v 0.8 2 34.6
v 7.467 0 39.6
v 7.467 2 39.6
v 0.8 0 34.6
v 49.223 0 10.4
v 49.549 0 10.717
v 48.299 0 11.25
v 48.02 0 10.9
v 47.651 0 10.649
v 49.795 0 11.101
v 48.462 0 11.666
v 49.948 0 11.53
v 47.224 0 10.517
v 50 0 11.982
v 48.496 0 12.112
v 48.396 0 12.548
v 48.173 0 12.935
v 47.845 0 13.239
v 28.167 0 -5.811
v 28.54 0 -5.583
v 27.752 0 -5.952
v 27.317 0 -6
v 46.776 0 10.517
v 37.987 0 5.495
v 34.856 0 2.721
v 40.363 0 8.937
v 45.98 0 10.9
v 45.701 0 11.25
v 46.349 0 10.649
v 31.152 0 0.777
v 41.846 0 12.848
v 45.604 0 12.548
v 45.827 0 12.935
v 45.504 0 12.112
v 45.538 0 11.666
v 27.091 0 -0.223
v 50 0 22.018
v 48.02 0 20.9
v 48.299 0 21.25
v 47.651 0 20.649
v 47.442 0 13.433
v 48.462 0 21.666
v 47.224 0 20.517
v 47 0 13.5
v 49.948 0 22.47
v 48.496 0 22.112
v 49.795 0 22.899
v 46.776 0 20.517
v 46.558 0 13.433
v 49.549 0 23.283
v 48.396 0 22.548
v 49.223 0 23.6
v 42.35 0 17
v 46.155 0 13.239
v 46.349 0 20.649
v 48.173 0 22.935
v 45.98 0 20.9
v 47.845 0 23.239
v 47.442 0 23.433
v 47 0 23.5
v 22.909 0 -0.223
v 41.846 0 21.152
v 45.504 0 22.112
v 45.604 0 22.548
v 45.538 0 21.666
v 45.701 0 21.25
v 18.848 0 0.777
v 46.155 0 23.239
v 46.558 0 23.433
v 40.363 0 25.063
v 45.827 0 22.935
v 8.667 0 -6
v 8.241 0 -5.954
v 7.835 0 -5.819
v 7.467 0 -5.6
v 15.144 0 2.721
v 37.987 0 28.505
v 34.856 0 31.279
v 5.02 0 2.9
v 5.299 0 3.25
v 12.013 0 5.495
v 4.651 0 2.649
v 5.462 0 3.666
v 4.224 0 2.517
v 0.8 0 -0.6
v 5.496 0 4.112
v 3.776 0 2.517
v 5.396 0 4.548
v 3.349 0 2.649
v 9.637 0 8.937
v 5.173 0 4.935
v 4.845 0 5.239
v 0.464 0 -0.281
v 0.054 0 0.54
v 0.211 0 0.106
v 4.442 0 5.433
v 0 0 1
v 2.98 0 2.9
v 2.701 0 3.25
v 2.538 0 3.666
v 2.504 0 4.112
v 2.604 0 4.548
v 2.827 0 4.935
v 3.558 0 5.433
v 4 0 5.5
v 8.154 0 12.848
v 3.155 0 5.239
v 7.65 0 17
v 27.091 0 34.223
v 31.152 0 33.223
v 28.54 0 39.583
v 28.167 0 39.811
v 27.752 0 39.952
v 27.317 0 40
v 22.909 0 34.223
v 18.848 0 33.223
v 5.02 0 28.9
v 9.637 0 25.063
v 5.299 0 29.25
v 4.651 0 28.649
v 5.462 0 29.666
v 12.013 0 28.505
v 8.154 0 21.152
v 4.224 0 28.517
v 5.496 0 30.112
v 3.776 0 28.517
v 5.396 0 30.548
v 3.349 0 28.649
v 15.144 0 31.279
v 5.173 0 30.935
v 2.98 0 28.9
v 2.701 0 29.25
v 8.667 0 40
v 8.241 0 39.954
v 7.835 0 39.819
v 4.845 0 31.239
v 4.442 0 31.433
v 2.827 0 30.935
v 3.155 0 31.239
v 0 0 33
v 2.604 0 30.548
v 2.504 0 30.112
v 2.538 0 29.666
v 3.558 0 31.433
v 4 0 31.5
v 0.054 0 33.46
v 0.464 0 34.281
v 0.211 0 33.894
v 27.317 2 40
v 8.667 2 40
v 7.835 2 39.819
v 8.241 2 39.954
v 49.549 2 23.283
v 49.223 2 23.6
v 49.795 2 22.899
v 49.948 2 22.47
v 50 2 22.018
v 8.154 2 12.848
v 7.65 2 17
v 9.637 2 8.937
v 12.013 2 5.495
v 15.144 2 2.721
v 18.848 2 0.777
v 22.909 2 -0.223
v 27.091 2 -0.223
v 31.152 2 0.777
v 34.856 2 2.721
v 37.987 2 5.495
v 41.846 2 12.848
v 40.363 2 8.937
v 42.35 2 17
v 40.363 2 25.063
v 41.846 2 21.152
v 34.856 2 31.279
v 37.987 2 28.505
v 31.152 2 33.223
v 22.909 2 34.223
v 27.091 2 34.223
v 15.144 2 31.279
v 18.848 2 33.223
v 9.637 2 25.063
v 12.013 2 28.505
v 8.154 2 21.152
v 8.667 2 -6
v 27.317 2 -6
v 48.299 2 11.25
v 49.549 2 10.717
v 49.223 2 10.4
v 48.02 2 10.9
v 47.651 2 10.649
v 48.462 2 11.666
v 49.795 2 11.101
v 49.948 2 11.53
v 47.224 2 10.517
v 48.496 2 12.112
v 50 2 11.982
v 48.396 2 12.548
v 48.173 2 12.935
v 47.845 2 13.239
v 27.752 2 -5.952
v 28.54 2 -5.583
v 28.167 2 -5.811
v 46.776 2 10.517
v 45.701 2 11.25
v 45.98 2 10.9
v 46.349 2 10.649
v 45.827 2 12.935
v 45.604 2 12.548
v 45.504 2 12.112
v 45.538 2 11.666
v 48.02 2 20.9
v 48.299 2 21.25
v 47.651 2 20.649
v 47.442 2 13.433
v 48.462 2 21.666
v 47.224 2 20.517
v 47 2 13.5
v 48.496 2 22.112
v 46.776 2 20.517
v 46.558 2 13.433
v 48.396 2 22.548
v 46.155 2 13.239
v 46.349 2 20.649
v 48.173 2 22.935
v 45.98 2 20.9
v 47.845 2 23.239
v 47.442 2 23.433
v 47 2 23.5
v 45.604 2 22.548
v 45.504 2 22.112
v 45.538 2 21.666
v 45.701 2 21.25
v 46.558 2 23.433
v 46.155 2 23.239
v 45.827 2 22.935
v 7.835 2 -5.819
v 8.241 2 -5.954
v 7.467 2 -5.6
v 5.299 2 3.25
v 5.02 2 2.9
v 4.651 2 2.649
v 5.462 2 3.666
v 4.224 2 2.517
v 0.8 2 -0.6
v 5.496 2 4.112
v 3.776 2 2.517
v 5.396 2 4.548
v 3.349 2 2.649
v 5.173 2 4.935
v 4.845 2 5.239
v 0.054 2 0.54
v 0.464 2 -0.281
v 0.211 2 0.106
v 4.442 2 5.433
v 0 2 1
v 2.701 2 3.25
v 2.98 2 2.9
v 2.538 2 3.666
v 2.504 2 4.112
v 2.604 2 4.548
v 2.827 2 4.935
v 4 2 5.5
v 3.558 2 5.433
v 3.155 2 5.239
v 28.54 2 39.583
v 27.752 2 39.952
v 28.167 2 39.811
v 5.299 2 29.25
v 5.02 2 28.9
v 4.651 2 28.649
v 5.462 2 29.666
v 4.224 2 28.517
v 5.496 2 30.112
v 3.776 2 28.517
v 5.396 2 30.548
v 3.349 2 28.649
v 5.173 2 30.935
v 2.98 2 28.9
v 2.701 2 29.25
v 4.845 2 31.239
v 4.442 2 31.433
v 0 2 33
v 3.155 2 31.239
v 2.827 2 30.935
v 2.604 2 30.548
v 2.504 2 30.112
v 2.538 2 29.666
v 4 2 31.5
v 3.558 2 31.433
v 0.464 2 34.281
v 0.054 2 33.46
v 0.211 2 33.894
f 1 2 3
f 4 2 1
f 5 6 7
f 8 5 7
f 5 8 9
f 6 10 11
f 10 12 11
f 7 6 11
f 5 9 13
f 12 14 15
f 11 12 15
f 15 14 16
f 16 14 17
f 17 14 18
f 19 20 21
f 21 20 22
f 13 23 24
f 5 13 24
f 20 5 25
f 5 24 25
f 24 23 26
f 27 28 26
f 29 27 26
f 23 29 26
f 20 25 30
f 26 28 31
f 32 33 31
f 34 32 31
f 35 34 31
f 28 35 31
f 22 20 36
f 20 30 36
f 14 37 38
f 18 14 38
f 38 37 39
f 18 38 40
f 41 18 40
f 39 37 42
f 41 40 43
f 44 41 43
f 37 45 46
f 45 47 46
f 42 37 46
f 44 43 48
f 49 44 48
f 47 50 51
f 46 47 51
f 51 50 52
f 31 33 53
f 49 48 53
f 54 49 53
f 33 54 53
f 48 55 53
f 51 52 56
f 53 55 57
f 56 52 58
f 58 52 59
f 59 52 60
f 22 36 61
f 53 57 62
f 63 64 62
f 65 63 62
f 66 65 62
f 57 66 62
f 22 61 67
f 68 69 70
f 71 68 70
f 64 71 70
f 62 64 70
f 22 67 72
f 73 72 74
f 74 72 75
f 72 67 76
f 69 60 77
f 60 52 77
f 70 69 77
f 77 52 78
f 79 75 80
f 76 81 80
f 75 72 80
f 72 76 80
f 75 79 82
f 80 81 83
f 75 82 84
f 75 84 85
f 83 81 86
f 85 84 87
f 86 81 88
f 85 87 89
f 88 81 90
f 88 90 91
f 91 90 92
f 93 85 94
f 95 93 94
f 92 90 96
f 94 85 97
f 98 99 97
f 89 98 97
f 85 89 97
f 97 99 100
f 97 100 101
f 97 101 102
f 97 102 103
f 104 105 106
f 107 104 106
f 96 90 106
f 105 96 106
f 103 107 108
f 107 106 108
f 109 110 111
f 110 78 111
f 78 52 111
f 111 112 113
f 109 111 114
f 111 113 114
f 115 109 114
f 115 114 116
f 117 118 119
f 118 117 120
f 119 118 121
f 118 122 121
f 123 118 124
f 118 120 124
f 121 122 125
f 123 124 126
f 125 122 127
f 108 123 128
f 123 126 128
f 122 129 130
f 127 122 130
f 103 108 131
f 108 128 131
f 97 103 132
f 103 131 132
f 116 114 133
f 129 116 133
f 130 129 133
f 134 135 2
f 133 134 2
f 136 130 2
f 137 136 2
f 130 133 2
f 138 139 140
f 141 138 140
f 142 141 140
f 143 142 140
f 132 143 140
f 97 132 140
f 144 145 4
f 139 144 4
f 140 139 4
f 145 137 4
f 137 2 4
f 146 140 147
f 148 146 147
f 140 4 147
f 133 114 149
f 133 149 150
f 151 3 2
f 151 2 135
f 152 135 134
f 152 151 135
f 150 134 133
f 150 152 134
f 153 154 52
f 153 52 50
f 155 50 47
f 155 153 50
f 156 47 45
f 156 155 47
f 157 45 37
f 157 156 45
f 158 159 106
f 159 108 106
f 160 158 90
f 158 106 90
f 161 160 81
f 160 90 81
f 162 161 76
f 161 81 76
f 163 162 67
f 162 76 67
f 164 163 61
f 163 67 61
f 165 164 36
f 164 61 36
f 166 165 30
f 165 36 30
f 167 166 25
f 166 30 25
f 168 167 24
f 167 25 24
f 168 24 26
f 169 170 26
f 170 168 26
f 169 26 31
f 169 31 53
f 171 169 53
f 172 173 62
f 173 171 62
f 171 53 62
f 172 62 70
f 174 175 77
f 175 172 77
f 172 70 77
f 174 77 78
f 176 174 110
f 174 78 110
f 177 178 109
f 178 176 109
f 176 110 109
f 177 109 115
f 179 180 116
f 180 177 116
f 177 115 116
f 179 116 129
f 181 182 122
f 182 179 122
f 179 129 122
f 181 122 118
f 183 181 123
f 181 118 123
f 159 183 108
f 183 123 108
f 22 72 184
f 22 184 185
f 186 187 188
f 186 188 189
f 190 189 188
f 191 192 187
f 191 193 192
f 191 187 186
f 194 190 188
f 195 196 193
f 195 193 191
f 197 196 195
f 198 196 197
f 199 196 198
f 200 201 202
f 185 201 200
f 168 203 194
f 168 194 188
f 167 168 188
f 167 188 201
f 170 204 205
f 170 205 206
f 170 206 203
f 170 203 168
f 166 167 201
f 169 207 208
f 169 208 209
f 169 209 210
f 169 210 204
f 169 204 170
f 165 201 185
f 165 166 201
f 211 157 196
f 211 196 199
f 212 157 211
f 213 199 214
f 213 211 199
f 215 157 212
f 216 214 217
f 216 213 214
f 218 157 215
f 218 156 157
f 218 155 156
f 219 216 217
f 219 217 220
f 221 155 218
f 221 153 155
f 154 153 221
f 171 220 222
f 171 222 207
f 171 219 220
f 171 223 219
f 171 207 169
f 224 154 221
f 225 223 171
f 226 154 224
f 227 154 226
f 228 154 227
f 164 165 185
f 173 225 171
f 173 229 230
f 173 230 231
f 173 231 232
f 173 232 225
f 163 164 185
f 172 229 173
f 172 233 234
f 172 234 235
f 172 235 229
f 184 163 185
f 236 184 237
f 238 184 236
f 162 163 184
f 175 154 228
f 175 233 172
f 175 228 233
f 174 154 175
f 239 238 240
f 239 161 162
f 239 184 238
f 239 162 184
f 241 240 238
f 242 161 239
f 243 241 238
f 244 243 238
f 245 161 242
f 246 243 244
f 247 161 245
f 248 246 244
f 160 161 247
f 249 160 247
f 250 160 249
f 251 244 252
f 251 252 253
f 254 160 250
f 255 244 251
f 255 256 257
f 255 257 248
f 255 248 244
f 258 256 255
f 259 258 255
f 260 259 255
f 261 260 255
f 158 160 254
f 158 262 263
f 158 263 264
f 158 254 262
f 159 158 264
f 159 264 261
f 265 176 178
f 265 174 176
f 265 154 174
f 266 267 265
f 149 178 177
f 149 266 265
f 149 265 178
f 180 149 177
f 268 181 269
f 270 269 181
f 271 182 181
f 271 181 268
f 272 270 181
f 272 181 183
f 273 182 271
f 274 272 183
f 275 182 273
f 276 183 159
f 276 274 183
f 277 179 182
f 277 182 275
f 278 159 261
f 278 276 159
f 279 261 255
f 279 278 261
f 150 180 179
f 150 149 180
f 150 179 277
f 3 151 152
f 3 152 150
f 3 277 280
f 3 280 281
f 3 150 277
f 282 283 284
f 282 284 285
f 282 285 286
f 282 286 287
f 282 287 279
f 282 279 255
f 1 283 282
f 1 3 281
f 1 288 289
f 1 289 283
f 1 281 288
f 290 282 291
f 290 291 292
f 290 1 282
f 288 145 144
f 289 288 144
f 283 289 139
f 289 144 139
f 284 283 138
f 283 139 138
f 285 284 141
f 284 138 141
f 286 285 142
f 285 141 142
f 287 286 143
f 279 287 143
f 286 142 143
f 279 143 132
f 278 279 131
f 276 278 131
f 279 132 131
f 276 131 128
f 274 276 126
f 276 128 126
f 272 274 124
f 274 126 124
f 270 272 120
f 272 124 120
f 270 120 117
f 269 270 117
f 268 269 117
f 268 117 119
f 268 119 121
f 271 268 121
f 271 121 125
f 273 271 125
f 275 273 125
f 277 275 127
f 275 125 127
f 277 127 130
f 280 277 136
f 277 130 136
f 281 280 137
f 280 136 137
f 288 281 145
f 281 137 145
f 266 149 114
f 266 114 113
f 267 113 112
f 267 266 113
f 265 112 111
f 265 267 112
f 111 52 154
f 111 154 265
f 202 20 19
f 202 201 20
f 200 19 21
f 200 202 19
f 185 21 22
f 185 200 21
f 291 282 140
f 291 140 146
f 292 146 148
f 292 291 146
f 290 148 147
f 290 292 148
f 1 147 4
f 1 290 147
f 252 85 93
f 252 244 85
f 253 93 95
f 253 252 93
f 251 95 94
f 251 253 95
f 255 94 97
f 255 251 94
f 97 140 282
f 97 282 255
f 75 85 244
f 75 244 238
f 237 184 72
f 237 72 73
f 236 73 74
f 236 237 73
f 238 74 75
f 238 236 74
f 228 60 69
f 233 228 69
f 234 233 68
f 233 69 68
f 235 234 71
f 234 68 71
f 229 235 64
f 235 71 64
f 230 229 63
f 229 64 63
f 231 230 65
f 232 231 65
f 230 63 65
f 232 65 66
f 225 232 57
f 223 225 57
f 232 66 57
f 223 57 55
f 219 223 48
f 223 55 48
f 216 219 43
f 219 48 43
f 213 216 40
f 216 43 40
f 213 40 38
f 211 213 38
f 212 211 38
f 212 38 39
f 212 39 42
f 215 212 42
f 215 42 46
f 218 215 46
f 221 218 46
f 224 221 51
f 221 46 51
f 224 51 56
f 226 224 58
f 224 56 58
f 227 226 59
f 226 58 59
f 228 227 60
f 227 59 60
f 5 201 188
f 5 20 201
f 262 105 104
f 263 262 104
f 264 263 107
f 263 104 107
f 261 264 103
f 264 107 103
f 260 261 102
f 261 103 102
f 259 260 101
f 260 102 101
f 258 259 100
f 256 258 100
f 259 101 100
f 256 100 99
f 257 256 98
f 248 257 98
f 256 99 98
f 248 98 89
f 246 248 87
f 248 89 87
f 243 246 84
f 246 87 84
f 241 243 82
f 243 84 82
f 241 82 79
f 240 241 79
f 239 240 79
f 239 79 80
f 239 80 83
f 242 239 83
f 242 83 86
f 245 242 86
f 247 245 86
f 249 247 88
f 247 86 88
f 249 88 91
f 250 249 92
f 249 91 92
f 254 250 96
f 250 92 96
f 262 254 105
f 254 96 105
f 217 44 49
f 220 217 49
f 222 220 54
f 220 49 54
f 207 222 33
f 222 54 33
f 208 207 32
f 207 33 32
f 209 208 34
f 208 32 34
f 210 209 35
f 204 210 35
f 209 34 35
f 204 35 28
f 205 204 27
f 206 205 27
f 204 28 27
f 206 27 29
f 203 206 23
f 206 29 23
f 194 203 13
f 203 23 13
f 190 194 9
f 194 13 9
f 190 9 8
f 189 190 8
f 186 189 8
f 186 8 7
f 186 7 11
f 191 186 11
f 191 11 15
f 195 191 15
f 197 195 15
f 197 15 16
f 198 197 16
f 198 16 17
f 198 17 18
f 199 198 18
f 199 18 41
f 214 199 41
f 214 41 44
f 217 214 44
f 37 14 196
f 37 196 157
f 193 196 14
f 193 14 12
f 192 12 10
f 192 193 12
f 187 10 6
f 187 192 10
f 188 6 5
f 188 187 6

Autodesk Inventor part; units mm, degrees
ref_plane "YZ Plane" through (0, 0, 0) normal (1, 0, 0) x (0, 1, 0)
ref_plane "XZ Plane" through (0, 0, 0) normal (0, 1, 0) x (-1, 0, 0)
ref_plane "XY Plane" through (0, 0, 0) normal (0, 0, 1) x (1, 0, 0)
sketch "スケッチ8" plane through (0, 0, 0) normal (0, 1, 0) x (-1, 0, 0)
  line L0 (0, 0) -> (-8, -6)
  line L1 (-8, -6) -> (-28, -6)
  line L2 (-28, -6) -> (-50, 11)
  line L3 (-50, 11) -> (-50, 23)
  line L4 (-50, 23) -> (-28, 40)
  line L5 (-28, 40) -> (-8, 40)
  line L6 (-8, 40) -> (0, 34)
  line L7 (0, 34) -> (0, 0)
  circle A0 centre (-25, 17) radius 17.35
  dimension "d41" = 34
  dimension "d42" = 6
  dimension "d43" = 6
  dimension "d44" = 8
  dimension "d45" = 20
  dimension "d46" = 22
  dimension "d47" = 17
  dimension "d48" = 17
  dimension "d49" = 34.7
  dimension "d50" = 25
  dimension "d51" = 23
extrude "プレート6" add sketch "スケッチ8" along normal blind 2
sketch "スケッチ9" plane through (0, 2, 0) normal (0, 1, 0) x (1, 0, 0)
  line L0 (0, -34) -> (0, 0) projected
  line L1 (50, -11) -> (50, -23) projected
  point P0 (4, -4)
  point P1 (4, -30)
  point P2 (47, -22)
  point P3 (47, -12)
  dimension "d53" = 4
  dimension "d54" = 4
  dimension "d55" = 26
  dimension "d56" = 3
  dimension "d57" = 1
  dimension "d58" = 1
hole "穴1" at (4, 2, 4) at (4, 2, 30) at (47, 2, 22) at (47, 2, 12) direction (0, -1, 0) diameter 3 end through all
fillet "コーナーR1" radius 2 8 edges at (0, 1, 34) (8, 1, 40) (28, 1, 40) (50, 1, 23) (50, 1, 11) (28, 1, -6) (0, 1, 0) (8, 1, -6)
sketch "スケッチ10" plane through (49.2229, 0, 23.6005) normal (0.6114475, 0, 0.791285) x (0.791285, 0, -0.6114475)
  point P0 (-24.5189, 0)
equation "\"d64\" = Thickness"
equation "\"d52\" = Thickness"
equation "\"BendRadius\" = Thickness"
equation "\"BendReliefWidth\" = Thickness"
equation "\"BendReliefDepth\" = 0.5 * Thickness"
equation "\"CornerReliefSize\" = 4 * Thickness"
equation "\"MinimumRemnant\" = 2 * Thickness"
equation "\"TransitionRadius\" = BendRadius"
equation "\"JacobiRadiusSize\" = Thickness"
equation "\"GapSize\" = Thickness"
equation "\"Thickness\" = 2"
properties part number "trackball-cover" material "アルミニウム 6061"
